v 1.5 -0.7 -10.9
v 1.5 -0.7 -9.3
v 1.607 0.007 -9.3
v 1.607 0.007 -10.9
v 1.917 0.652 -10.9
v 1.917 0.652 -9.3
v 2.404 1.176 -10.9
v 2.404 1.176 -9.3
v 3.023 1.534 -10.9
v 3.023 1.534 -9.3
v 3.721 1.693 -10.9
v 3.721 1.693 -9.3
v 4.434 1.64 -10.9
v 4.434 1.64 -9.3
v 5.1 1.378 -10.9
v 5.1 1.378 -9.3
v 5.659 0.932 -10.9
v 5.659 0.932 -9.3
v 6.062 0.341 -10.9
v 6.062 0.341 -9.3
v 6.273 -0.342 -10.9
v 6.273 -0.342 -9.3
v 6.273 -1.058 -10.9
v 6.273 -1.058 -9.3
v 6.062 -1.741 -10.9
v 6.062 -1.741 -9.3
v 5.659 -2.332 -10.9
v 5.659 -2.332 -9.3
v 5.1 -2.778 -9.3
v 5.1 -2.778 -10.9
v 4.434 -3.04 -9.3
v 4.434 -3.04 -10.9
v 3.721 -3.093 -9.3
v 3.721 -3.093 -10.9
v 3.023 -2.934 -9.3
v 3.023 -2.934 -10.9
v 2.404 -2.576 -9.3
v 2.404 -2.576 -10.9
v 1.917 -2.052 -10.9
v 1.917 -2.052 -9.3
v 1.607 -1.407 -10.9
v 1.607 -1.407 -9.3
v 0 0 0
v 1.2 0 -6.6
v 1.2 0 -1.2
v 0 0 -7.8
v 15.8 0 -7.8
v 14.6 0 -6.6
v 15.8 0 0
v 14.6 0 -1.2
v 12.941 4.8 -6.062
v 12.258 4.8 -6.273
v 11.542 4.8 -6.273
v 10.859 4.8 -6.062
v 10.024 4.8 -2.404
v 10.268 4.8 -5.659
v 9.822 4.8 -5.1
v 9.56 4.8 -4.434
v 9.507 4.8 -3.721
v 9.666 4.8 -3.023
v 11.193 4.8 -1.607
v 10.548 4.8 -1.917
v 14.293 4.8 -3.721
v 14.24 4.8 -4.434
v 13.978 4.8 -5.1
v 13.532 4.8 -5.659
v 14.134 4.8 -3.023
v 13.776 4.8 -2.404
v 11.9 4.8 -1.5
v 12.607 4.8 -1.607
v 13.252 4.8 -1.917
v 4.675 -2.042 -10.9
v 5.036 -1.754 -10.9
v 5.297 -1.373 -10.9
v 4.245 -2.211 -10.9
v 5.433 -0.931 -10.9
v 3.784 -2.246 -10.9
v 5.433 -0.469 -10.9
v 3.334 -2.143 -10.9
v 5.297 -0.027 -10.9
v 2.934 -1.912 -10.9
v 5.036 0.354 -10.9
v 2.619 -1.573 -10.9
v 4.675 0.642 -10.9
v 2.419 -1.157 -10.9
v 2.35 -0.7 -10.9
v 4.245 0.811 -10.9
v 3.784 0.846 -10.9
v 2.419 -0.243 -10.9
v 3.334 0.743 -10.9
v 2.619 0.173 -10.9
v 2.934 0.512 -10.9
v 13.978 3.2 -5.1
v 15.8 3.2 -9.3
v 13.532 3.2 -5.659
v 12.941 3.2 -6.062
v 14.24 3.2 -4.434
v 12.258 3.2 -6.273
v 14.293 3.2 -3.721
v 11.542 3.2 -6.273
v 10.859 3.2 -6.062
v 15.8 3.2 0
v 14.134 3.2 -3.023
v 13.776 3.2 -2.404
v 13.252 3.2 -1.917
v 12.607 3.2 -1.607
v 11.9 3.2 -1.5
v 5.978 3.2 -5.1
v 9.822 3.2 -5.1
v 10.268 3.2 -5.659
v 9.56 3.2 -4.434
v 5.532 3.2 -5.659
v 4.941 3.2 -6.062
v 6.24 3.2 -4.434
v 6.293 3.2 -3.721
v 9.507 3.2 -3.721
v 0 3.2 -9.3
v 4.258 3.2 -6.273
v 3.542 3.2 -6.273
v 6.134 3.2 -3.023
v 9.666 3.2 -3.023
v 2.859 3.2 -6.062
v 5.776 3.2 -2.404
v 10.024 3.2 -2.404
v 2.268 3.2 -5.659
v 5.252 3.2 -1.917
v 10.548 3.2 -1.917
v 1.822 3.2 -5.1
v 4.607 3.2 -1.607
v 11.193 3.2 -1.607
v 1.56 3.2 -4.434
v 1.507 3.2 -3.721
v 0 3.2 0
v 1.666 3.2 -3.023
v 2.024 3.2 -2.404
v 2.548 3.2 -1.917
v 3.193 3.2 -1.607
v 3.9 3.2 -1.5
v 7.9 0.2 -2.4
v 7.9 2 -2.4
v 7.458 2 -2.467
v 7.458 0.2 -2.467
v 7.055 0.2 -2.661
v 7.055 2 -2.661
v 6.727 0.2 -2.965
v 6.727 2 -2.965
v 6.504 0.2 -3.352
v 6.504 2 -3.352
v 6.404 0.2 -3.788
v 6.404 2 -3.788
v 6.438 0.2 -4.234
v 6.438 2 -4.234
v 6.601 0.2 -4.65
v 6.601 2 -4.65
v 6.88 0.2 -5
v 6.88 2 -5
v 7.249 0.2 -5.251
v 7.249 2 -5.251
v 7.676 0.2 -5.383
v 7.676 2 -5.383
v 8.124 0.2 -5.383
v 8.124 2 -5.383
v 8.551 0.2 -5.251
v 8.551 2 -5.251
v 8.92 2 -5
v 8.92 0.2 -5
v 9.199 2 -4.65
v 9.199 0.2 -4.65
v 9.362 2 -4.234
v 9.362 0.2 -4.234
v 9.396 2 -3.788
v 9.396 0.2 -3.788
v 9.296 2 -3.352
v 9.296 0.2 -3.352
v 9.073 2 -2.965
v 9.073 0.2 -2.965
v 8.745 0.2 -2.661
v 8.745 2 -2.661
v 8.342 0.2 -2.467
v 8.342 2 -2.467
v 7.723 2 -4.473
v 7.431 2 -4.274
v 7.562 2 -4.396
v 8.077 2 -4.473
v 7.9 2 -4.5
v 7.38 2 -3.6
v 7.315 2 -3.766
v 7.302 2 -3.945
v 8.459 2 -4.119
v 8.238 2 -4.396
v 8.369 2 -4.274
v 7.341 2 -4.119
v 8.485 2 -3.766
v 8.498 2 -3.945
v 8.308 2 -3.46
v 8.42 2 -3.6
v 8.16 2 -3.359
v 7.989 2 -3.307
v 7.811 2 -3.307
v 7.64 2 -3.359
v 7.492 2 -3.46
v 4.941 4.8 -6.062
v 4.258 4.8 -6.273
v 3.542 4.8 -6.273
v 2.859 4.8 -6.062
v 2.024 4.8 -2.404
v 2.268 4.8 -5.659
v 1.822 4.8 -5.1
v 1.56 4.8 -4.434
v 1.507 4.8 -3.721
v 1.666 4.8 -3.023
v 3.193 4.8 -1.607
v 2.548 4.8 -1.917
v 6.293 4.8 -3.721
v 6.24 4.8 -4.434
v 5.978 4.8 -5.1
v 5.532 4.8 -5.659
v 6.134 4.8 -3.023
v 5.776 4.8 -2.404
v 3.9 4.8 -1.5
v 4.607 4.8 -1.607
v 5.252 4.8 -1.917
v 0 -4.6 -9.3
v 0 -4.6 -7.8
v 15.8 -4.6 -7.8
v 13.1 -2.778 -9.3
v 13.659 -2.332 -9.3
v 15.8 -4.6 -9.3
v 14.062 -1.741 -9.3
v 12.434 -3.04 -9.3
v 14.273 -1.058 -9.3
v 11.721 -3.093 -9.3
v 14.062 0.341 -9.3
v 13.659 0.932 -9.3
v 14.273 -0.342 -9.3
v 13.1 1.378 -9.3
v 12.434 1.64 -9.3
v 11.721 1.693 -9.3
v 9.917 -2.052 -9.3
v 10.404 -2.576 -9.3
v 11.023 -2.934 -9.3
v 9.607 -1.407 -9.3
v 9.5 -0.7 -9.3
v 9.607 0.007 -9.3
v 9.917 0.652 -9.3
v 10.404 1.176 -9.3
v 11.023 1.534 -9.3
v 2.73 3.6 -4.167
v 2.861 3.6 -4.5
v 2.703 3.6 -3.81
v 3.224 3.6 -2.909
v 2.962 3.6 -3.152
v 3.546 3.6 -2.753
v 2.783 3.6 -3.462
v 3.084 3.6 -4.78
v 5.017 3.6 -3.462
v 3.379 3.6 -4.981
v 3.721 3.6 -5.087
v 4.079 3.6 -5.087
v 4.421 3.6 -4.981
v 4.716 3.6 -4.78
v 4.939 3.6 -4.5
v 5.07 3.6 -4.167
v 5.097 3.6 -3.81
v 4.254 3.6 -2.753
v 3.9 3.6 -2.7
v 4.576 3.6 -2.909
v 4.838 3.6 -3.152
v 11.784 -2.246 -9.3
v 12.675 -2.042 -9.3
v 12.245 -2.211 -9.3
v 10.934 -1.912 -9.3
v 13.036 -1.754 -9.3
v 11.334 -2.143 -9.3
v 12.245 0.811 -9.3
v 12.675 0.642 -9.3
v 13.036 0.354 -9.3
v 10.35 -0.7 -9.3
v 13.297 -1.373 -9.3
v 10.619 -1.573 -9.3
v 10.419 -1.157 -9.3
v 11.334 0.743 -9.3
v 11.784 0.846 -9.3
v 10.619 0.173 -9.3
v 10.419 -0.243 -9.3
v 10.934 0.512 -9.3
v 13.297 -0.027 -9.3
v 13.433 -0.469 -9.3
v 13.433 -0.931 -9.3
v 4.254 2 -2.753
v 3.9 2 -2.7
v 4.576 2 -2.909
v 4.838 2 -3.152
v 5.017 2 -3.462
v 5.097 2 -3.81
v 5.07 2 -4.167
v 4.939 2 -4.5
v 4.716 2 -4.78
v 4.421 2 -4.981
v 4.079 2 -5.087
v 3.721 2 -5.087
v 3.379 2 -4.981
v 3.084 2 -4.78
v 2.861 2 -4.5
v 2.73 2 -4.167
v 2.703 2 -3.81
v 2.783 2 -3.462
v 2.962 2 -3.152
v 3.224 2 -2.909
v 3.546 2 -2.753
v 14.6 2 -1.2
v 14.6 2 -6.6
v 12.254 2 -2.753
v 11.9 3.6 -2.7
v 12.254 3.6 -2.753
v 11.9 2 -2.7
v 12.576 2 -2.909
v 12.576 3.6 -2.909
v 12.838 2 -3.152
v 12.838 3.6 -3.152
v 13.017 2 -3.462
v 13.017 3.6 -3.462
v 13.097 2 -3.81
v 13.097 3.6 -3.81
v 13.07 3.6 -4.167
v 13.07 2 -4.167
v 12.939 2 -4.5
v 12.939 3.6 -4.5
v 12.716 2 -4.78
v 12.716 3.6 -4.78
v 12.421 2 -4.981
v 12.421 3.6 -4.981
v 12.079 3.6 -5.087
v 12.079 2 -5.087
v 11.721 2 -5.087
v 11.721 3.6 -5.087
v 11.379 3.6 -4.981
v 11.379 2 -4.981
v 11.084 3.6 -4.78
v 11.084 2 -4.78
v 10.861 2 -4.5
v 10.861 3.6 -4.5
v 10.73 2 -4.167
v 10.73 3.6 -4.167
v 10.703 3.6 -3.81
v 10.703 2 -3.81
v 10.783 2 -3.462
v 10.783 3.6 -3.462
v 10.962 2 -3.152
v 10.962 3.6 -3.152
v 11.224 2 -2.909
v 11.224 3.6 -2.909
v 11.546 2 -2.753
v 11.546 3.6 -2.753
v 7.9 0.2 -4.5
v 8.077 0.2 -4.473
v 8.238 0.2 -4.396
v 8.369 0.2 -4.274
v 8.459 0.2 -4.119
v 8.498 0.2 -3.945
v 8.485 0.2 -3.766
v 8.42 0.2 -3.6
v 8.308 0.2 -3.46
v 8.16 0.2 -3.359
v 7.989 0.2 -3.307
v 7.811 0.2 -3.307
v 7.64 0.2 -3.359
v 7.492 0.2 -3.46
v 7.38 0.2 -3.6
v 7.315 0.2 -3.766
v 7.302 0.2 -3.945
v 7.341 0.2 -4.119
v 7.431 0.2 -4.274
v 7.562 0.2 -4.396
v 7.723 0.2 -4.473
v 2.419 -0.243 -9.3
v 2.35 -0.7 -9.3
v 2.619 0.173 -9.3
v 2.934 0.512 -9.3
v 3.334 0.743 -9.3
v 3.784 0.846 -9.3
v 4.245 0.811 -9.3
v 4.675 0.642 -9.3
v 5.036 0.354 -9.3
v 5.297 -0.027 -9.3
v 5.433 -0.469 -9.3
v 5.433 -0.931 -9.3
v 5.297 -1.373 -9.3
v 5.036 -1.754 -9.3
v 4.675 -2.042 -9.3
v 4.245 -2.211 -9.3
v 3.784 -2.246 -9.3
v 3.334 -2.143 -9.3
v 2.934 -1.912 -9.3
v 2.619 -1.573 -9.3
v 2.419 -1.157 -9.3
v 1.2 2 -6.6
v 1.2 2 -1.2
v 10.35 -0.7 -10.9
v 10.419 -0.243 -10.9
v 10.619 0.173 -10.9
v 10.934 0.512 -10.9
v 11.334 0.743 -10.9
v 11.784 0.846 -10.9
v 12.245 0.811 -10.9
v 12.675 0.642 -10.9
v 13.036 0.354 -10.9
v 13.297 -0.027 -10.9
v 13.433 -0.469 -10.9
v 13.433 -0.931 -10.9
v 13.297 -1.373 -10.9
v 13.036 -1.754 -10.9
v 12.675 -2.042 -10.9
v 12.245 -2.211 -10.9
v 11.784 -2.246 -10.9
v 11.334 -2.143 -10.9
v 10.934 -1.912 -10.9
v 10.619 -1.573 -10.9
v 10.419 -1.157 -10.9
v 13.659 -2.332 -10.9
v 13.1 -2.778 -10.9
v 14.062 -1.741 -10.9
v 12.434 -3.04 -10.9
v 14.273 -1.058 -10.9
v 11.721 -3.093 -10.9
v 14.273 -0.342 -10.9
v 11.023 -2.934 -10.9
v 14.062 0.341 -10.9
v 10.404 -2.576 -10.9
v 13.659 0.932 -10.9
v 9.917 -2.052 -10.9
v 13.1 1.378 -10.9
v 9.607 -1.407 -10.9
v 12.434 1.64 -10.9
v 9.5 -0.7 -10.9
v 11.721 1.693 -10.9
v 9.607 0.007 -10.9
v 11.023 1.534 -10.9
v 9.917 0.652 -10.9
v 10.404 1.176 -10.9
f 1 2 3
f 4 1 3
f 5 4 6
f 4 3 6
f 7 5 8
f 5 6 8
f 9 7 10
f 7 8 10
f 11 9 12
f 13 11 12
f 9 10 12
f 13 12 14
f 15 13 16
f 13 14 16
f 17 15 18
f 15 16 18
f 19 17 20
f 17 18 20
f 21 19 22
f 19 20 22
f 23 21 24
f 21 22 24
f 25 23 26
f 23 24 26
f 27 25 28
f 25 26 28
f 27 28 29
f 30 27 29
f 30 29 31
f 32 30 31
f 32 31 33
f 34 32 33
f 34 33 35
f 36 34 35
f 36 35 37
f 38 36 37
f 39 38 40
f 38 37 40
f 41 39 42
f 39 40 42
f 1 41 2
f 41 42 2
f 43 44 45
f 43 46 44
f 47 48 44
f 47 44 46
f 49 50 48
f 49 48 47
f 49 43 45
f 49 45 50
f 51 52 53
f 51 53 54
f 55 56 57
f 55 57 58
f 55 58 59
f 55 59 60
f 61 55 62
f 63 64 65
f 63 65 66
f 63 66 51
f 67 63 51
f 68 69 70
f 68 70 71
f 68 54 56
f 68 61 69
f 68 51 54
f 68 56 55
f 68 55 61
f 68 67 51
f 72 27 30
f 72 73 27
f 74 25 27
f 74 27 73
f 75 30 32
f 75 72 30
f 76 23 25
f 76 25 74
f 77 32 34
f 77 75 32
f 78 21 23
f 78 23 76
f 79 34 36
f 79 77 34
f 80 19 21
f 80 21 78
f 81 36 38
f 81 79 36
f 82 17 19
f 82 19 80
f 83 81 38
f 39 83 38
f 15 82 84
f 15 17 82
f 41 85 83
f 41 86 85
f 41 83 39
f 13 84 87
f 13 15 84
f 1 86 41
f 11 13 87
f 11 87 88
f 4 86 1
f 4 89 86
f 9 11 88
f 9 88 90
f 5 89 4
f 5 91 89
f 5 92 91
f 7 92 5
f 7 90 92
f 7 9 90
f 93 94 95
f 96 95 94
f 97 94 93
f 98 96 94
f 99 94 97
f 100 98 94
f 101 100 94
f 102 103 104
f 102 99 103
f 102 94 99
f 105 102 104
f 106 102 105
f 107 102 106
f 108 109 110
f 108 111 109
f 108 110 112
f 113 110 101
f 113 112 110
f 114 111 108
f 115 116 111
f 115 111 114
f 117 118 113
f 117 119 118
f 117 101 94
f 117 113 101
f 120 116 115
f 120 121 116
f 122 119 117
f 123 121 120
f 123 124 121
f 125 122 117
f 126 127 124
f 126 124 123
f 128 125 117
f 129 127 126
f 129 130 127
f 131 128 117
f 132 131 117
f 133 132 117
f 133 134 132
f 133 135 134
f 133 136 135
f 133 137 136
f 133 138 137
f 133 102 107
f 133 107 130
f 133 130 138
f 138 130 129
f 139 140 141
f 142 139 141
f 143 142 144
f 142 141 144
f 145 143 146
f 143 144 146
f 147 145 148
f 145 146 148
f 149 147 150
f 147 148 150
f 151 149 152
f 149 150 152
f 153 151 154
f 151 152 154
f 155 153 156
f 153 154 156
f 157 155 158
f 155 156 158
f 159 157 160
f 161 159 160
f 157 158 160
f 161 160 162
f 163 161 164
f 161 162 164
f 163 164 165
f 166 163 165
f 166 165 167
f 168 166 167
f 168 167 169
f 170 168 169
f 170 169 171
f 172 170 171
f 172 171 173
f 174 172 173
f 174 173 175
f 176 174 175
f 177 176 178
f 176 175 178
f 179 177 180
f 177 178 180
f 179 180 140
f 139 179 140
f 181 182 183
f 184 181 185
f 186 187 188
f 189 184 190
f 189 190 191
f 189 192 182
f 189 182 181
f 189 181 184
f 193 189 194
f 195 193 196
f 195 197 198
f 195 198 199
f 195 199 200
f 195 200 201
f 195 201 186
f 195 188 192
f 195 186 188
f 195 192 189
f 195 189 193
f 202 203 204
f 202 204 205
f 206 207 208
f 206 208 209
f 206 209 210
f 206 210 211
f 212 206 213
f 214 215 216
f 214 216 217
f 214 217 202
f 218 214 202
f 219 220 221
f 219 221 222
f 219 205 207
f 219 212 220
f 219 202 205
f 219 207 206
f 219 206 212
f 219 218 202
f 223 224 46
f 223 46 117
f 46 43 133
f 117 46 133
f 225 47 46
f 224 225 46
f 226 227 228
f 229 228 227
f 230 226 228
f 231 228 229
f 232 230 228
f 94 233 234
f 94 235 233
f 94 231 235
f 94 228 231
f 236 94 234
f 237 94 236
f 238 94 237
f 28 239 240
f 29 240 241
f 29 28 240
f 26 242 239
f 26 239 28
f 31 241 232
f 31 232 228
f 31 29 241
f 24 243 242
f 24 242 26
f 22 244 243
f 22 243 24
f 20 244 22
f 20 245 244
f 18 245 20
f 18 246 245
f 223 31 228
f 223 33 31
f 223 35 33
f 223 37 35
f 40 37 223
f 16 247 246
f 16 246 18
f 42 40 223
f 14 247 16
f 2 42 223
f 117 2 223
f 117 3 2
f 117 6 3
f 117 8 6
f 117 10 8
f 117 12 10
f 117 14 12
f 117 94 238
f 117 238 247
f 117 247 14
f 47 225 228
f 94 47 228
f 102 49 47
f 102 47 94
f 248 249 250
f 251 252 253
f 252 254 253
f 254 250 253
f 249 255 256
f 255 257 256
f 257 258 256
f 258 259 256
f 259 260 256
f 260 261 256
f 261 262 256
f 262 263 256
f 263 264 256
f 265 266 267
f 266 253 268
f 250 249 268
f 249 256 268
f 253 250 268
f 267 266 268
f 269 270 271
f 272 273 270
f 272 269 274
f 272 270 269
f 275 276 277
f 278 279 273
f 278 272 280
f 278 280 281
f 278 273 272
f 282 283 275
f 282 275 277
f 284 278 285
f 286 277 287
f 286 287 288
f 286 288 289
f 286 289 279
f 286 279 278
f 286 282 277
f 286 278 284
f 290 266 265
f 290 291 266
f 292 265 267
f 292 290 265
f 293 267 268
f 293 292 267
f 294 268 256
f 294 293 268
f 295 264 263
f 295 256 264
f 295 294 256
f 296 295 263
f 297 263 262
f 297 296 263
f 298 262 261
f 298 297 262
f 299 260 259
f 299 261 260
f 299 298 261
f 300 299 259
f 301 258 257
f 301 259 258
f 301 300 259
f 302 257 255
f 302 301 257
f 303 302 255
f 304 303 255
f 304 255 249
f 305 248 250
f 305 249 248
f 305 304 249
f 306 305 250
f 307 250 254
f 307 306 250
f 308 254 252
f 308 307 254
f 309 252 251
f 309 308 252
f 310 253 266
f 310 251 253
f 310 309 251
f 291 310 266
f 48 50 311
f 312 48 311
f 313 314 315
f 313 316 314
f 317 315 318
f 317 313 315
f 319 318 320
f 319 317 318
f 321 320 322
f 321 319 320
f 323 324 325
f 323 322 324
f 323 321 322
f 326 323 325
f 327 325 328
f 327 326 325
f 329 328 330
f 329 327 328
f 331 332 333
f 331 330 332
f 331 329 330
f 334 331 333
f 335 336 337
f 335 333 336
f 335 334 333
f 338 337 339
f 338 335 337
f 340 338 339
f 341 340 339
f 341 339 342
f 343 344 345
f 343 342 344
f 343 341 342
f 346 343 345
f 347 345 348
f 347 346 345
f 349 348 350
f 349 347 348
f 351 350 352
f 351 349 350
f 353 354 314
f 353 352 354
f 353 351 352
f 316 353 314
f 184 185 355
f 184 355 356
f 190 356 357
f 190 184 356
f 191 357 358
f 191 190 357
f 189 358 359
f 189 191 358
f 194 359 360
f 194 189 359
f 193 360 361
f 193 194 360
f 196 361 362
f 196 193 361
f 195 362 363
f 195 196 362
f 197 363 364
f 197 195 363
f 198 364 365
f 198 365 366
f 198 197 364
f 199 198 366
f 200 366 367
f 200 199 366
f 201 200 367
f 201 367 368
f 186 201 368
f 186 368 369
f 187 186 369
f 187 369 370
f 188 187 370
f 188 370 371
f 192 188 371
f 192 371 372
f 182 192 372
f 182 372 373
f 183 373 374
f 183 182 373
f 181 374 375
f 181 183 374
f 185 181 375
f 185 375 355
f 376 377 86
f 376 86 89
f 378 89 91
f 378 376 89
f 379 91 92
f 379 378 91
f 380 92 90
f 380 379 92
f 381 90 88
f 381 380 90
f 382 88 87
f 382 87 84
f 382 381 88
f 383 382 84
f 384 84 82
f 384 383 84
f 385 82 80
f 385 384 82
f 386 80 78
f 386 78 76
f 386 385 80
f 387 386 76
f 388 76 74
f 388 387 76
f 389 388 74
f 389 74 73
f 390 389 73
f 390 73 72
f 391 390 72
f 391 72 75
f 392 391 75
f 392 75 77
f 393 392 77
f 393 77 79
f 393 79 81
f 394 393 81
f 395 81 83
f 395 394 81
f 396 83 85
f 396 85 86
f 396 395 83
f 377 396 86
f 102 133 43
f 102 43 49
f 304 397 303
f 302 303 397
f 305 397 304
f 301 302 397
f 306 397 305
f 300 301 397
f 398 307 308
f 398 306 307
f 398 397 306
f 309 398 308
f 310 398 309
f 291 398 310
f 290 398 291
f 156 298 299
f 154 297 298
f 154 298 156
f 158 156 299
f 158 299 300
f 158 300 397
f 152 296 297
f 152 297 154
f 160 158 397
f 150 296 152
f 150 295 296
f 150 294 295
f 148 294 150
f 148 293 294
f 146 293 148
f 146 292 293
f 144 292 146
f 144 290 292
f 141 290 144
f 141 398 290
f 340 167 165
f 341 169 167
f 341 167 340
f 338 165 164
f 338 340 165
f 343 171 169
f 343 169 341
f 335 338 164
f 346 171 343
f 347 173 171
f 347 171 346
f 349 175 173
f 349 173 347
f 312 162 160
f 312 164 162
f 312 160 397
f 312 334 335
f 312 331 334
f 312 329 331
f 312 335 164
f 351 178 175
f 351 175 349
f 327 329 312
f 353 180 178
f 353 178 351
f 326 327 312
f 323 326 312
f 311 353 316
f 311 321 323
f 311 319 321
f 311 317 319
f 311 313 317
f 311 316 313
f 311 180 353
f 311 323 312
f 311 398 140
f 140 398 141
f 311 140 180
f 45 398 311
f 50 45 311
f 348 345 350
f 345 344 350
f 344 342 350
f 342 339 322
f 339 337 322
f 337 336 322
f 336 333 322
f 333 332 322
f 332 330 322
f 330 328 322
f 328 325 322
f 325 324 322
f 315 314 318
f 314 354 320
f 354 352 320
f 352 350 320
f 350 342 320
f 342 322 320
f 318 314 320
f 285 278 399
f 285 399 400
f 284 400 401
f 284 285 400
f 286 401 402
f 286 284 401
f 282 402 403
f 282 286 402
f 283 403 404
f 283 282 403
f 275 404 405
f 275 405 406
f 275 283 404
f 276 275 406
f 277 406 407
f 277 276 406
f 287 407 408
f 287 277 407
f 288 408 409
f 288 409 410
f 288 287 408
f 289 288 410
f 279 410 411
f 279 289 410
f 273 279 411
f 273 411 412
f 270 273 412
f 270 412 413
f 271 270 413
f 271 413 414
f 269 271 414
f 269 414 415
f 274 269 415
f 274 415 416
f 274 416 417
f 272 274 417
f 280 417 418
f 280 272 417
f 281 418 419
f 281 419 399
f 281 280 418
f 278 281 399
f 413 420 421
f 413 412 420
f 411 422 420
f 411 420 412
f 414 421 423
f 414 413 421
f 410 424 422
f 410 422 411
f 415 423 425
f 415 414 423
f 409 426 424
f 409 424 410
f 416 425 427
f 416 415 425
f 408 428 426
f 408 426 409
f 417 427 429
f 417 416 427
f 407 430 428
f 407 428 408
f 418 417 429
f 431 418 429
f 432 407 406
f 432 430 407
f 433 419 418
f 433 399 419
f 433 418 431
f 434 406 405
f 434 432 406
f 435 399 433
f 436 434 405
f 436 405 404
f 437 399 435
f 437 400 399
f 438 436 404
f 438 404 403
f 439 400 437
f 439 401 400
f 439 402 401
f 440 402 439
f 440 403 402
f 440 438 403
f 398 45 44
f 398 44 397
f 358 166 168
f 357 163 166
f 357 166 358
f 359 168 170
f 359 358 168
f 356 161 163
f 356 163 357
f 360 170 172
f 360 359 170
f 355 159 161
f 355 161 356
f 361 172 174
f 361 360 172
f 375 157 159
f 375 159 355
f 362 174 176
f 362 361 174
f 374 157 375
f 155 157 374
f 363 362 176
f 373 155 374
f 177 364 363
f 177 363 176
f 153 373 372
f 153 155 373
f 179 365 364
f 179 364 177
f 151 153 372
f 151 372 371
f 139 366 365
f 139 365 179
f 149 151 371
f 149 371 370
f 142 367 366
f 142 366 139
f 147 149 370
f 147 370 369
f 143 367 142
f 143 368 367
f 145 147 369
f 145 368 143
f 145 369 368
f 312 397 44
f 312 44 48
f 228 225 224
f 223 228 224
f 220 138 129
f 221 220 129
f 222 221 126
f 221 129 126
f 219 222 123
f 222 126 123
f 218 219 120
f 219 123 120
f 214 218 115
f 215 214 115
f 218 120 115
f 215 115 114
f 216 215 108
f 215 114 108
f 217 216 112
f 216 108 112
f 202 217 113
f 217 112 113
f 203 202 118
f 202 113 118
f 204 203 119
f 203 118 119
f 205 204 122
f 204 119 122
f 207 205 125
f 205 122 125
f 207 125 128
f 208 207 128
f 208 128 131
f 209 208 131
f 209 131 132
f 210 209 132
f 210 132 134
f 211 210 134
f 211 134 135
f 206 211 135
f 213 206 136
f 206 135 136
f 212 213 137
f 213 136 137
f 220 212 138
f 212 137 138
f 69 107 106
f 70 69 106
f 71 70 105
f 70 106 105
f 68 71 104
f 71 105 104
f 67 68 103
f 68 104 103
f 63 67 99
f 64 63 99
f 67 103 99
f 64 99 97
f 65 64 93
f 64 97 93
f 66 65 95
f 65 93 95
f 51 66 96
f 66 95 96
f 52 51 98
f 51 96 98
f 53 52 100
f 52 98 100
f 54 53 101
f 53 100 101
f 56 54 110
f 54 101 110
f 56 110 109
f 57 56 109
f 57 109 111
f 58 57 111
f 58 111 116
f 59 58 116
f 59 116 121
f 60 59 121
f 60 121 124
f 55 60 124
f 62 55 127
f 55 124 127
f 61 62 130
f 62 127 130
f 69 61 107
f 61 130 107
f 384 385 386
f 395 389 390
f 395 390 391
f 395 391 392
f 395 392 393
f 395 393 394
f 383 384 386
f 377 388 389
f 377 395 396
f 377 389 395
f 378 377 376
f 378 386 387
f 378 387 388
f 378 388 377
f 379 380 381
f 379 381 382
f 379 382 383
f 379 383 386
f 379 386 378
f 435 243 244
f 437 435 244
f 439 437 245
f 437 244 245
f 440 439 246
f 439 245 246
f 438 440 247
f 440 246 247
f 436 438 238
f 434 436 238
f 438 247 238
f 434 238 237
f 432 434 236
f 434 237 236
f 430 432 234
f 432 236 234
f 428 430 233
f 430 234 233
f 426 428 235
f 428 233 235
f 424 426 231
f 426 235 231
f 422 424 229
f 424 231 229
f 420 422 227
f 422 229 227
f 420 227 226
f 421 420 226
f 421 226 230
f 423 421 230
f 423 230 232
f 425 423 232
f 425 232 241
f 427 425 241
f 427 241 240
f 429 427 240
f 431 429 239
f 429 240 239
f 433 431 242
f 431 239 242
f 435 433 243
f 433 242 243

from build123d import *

# Parameters (mm, degrees)
SKETCH1_W            = 15.8
SKETCH1_H            = 3.2
BOSS_EXTRUDE1_DEPTH  = 7.8
SKETCH2_R            = 2.4
BOSS_EXTRUDE2_DEPTH  = 1.6
LPATTERN1_COUNT      = 2
LPATTERN1_PITCH      = 8
LPATTERN1_COUNT_DIR2 = 6
LPATTERN1_PITCH_DIR2 = 8
SHELL1_T             = -1.2
SKETCH3_R            = 1.5
SKETCH3_R_2          = 0.6
BOSS_EXTRUDE3_DEPTH  = 1.8
SKETCH4_W            = 15.8
SKETCH4_H            = 7.8
BOSS_EXTRUDE4_DEPTH  = 1.5
SKETCH5_R            = 2.4
SKETCH5_R_2          = 1.55
BOSS_EXTRUDE5_DEPTH  = 1.6
LPATTERN2_COUNT      = 2
LPATTERN2_PITCH      = 8


with BuildPart() as part:
    # Sketch1 → Boss-Extrude1 (new body)
    with BuildSketch(Plane.XY):
        with Locations((7.9, 1.6)):
            Rectangle(SKETCH1_W, SKETCH1_H)
    extrude(amount=-BOSS_EXTRUDE1_DEPTH)

    # Sketch2 → Boss-Extrude2 (add)
    with BuildSketch(Plane(origin=(0, 3.2, 0), x_dir=(1, 0, 0), z_dir=(0, 1, 0))):
        with Locations(Location((3.9, 3.9, 0), (0, 0, 270))):
            Circle(SKETCH2_R)
    boss_extrude2 = extrude(amount=BOSS_EXTRUDE2_DEPTH)

    # LPattern1: Boss-Extrude2 2 × 6, 10 skipped
    with Locations(*[(j * LPATTERN1_PITCH_DIR2, 0, i * LPATTERN1_PITCH) for i in range(LPATTERN1_COUNT) for j in range(LPATTERN1_COUNT_DIR2) if (i, j) not in ((0, 0), (0, 2), (0, 3), (0, 4), (0, 5), (1, 0), (1, 1), (1, 2), (1, 3), (1, 4), (1, 5))]):
        add(boss_extrude2)

    # Shell1
    shell1_openings = [part.faces().sort_by_distance(p)[0] for p in [
        (7.9, 0, -3.9),
    ]]
    offset(amount=SHELL1_T, openings=shell1_openings, kind=Kind.INTERSECTION)

    # Sketch3 → Boss-Extrude3 (add)
    with BuildSketch(Plane.XZ.offset(-2)):
        with Locations(Location((7.9, -3.9, 0), (0, 0, 90))):
            Circle(SKETCH3_R)
        with Locations(Location((7.9, -3.9, 0), (0, 0, 270))):
            Circle(SKETCH3_R_2, mode=Mode.SUBTRACT)
    extrude(amount=BOSS_EXTRUDE3_DEPTH)

    # Sketch4 → Boss-Extrude4 (add)
    with BuildSketch(Plane(origin=(0, 0, -7.8), x_dir=(-1, 0, 0), z_dir=(0, 0, -1))):
        with Locations((-7.9, -0.7)):
            Rectangle(SKETCH4_W, SKETCH4_H)
    extrude(amount=BOSS_EXTRUDE4_DEPTH)

    # Sketch5 → Boss-Extrude5 (add)
    with BuildSketch(Plane(origin=(0, 0, -9.3), x_dir=(-1, 0, 0), z_dir=(0, 0, -1))):
        with Locations((-3.9, -0.7)):
            Circle(SKETCH5_R)
        with Locations((-3.9, -0.7)):
            Circle(SKETCH5_R_2, mode=Mode.SUBTRACT)
    boss_extrude5 = extrude(amount=BOSS_EXTRUDE5_DEPTH)

    # LPattern2: Boss-Extrude5 ×2
    with Locations(*[(i * LPATTERN2_PITCH, 0, 0) for i in range(1, LPATTERN2_COUNT)]):
        add(boss_extrude5)


solid = part.part
